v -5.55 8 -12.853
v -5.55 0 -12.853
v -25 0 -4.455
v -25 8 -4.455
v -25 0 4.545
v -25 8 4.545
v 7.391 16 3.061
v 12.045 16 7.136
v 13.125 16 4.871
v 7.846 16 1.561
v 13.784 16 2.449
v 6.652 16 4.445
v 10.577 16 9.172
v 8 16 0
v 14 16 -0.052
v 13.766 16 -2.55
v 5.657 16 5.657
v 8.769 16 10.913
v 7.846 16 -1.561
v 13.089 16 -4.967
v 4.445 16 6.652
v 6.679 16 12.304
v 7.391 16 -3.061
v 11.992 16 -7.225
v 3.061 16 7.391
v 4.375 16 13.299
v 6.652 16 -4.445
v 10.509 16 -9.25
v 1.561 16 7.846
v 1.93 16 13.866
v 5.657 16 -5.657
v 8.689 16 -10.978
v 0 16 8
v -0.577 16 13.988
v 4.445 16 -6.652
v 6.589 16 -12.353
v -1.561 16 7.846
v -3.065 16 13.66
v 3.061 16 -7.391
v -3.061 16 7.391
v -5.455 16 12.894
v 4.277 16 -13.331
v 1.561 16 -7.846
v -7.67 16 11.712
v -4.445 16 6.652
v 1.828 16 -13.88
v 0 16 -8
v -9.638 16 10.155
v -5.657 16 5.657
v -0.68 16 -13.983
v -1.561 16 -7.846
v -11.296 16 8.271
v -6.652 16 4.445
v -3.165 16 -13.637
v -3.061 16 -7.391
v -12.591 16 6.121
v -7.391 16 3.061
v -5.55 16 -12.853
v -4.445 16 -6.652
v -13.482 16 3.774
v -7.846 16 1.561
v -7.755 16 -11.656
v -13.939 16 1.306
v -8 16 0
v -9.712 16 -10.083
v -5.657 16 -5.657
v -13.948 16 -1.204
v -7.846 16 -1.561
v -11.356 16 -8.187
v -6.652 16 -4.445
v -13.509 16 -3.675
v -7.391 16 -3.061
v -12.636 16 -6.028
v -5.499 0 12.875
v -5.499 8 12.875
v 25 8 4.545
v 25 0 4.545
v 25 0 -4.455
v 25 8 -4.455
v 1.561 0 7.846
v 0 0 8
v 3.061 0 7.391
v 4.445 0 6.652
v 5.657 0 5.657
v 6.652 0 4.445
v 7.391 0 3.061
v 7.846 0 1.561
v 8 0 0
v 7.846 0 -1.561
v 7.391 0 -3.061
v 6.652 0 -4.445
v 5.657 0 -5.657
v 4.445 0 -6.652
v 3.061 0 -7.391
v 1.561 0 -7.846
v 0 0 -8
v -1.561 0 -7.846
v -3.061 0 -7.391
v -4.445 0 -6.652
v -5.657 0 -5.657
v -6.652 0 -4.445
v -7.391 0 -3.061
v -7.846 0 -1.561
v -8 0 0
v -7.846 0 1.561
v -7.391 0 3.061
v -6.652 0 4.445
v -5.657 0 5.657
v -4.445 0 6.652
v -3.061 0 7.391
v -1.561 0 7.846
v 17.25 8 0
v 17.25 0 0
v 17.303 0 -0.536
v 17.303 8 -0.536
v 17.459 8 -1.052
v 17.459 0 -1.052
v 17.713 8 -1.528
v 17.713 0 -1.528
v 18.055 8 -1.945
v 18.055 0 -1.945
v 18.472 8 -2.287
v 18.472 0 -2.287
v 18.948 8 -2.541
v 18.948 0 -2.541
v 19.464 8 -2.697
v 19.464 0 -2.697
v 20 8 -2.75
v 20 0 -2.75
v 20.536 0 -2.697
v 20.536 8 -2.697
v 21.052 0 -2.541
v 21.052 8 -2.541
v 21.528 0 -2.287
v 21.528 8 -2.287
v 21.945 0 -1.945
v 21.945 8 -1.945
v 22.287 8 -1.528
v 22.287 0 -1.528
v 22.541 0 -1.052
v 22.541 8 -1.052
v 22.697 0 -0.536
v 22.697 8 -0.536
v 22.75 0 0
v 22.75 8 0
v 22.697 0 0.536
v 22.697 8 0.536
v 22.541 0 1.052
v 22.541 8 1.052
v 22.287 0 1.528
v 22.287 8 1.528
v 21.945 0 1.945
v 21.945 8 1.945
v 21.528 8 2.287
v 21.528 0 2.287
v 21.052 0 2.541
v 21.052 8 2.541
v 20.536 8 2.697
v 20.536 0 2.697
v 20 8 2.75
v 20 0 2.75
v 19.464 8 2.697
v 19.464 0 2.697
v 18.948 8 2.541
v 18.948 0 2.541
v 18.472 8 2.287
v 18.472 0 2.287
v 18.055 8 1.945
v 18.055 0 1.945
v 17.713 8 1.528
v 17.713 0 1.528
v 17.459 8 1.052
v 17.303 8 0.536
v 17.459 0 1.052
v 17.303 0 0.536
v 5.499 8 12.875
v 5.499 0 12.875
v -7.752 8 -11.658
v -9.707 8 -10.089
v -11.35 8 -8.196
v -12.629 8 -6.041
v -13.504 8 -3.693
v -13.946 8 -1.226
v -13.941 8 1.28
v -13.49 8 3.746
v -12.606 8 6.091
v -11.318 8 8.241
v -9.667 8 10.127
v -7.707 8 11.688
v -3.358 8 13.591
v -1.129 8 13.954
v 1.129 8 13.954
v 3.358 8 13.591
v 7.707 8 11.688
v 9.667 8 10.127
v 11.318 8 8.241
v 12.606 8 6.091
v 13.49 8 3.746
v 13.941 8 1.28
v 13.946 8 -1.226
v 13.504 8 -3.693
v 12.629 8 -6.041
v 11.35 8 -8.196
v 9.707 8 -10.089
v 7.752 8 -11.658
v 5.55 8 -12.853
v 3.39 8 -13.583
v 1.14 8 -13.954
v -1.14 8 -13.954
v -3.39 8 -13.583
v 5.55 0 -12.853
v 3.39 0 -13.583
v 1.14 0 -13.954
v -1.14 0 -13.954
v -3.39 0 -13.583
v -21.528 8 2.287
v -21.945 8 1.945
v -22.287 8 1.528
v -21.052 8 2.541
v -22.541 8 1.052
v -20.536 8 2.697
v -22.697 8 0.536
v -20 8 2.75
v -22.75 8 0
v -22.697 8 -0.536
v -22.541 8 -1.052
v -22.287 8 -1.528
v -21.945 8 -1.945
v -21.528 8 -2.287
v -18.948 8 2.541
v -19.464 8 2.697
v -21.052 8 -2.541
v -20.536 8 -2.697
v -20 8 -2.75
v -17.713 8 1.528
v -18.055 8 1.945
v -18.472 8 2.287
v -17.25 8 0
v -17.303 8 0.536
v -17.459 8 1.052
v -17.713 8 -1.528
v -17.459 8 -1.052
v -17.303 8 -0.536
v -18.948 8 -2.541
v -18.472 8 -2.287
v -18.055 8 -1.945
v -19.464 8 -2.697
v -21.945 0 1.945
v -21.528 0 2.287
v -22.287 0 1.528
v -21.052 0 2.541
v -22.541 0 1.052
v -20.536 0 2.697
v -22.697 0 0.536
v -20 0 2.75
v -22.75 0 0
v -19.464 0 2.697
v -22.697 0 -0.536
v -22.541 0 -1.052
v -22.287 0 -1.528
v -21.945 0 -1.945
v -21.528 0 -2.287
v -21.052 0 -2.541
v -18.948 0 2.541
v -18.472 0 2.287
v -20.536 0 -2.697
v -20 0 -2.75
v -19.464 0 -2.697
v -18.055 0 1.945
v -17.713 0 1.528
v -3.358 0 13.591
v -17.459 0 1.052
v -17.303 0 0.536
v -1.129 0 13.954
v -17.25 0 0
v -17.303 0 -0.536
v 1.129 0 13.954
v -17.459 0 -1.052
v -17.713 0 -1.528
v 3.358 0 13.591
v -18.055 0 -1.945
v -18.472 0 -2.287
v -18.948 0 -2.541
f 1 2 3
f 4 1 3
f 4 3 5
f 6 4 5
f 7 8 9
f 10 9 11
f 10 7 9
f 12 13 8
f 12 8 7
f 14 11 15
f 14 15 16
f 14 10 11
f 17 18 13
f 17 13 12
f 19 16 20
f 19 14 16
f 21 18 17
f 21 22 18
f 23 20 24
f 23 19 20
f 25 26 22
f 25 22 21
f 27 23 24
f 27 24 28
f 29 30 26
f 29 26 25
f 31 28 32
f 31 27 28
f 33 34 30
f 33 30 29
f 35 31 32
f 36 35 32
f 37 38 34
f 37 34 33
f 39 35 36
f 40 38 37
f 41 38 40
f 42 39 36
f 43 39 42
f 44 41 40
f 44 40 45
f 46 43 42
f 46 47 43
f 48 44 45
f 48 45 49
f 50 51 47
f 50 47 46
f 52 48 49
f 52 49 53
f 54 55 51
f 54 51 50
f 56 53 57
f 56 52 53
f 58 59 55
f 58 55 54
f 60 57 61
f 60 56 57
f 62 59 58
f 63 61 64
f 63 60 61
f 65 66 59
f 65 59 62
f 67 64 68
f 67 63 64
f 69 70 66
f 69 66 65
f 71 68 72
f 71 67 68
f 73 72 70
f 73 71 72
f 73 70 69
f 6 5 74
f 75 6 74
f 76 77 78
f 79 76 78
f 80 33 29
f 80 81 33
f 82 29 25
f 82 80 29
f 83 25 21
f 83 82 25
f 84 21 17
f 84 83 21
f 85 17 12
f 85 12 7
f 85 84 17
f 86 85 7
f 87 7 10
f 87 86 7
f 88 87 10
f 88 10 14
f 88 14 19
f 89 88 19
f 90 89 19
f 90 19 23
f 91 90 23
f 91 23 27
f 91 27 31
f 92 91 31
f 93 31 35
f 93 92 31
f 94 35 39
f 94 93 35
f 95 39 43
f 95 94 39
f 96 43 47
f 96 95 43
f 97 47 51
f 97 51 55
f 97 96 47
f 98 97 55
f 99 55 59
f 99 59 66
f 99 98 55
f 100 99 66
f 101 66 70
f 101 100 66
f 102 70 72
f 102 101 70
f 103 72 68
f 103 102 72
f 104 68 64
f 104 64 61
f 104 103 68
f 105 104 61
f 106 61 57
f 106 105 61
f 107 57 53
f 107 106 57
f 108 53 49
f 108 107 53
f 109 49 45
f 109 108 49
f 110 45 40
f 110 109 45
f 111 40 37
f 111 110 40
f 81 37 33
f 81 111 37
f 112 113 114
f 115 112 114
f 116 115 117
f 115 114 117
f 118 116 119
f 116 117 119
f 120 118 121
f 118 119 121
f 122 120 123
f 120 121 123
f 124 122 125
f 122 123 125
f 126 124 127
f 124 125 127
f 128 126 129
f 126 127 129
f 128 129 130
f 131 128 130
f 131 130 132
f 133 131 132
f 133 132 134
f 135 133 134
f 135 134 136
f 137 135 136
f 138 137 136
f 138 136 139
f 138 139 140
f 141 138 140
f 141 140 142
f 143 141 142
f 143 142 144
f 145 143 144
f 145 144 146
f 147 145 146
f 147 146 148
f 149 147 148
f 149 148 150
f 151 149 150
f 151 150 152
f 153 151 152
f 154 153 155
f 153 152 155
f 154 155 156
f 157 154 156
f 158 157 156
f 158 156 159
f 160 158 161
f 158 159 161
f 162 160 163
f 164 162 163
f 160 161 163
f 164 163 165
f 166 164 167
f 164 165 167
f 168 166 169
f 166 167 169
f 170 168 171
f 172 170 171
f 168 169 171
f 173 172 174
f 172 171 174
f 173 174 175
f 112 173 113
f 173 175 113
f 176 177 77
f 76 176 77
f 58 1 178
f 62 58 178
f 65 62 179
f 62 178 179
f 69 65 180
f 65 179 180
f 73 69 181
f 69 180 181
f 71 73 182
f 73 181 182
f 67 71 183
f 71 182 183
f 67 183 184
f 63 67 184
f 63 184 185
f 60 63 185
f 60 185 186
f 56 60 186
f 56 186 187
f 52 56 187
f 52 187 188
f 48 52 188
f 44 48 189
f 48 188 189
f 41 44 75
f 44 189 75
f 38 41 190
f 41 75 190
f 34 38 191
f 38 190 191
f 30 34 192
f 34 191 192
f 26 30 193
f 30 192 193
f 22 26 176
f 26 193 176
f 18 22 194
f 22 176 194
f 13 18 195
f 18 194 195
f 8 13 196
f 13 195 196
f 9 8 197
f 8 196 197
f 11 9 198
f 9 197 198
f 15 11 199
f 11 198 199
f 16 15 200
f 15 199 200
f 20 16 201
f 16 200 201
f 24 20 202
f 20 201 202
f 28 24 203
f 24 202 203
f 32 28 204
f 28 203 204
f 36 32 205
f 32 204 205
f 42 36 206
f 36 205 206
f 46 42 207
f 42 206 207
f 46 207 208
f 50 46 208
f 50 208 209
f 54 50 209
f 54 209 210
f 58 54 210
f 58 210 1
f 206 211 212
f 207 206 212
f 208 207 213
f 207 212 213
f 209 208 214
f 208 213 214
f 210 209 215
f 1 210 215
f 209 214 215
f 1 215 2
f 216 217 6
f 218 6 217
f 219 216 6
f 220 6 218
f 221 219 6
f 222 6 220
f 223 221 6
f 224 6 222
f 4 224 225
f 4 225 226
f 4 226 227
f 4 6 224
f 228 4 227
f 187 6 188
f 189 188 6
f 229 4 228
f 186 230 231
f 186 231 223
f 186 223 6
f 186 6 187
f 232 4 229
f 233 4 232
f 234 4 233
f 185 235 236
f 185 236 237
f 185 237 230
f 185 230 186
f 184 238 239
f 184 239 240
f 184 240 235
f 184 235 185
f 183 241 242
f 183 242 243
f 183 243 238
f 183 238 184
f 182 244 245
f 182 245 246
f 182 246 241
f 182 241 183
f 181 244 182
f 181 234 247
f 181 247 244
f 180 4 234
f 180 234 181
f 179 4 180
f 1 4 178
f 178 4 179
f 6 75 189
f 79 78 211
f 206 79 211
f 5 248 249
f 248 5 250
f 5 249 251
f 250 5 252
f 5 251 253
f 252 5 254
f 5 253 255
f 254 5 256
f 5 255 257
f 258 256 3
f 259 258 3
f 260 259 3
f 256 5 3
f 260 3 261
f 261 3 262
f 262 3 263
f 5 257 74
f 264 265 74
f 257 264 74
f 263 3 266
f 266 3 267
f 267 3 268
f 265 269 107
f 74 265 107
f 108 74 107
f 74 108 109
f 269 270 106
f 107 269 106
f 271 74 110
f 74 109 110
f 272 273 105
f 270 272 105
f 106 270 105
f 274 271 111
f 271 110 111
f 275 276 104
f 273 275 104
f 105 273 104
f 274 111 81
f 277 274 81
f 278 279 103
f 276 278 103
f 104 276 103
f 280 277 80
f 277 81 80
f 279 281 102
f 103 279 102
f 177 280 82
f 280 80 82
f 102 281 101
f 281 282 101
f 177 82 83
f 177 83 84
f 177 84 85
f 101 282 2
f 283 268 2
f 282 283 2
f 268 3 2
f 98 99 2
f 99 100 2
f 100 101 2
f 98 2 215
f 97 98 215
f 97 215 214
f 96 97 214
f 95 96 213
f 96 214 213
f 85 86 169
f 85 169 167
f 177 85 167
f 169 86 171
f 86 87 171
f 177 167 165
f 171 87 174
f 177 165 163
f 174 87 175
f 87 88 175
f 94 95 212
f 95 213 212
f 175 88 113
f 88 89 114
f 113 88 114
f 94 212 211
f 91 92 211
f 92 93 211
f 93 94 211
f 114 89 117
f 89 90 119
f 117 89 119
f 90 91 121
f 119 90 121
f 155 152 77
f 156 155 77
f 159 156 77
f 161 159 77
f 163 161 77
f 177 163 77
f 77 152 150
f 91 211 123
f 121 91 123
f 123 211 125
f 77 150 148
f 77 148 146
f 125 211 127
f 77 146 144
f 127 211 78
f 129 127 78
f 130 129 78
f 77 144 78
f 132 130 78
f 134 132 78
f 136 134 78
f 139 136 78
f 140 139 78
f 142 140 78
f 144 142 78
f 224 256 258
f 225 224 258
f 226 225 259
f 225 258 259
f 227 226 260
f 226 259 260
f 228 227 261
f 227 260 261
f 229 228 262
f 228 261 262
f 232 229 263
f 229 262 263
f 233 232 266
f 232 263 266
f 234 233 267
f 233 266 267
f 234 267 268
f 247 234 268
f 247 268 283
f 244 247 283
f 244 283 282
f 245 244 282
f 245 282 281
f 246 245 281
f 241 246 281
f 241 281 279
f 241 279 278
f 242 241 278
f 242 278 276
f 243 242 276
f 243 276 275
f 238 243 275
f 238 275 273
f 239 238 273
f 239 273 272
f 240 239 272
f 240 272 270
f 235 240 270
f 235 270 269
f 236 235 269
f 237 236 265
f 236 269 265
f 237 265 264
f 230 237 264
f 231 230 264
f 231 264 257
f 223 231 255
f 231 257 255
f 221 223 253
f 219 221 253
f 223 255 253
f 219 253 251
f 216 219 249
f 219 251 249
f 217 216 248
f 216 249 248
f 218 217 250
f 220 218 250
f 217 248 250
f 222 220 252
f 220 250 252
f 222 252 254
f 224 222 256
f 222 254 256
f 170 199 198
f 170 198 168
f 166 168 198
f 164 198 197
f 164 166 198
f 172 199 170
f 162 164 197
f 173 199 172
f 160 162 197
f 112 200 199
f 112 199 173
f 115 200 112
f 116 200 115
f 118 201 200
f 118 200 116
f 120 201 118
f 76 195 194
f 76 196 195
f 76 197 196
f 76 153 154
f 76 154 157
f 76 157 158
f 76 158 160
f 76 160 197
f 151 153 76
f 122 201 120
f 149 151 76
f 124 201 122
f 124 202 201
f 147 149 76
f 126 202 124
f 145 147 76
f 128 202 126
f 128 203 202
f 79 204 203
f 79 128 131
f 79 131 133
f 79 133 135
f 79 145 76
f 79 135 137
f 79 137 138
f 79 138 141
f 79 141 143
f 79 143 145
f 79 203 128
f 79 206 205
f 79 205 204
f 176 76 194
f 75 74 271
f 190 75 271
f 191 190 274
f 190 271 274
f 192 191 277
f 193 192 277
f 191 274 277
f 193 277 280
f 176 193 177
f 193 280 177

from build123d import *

# Parameters (mm, degrees)
SKETCH_1_R         = 8
EXTRUDE_1_DEPTH    = 8
SKETCH_2_R         = 14
SKETCH_2_R_2       = 8
EXTRUDE_2_DEPTH    = 8
HOLE_WIZARD_M5_1_D = 5.5


with BuildPart() as part:
    # 草图1 → 凸台-拉伸1 (new body)
    with BuildSketch(Plane(origin=(0, 0, 0), x_dir=(1, 0, 0), z_dir=(0, 1, 0))):
        with BuildLine():
            Line((-25, 4.45481098), (-25, -4.54518902))
            Line((-25, -4.54518902), (-5.499282233, -12.874699799))
            ThreePointArc((-5.499282233, -12.874699799), (0, -14), (5.499282233, -12.874699799))
            Line((5.499282233, -12.874699799), (25, -4.54518902))
            Line((25, -4.54518902), (25, 4.45481098))
            Line((25, 4.45481098), (5.549682792, 12.853054925))
            ThreePointArc((5.549682792, 12.853054925), (0, 14), (-5.549682792, 12.853054925))
            Line((-5.549682792, 12.853054925), (-25, 4.45481098))
        make_face()
        with Locations(Location((0, 0, 0), (0, 0, 270))):
            Circle(SKETCH_1_R, mode=Mode.SUBTRACT)
    extrude(amount=EXTRUDE_1_DEPTH)

    # 草图2 → 凸台-拉伸2 (add)
    with BuildSketch(Plane(origin=(0, 8, 0), x_dir=(1, 0, 0), z_dir=(0, 1, 0))):
        with Locations(Location((0, 0, 0), (0, 0, 113.353686186))):
            Circle(SKETCH_2_R)
        with Locations(Location((0, 0, 0), (0, 0, 270))):
            Circle(SKETCH_2_R_2, mode=Mode.SUBTRACT)
    extrude(amount=EXTRUDE_2_DEPTH)

    # M5 间隙孔1 (through all)
    with Locations(Plane(origin=(0, 8, 0), x_dir=(1, 0, 0), z_dir=(0, 1, 0))):
        with Locations((-20, 0), (20, 0)):
            Hole(HOLE_WIZARD_M5_1_D / 2)


solid = part.part
